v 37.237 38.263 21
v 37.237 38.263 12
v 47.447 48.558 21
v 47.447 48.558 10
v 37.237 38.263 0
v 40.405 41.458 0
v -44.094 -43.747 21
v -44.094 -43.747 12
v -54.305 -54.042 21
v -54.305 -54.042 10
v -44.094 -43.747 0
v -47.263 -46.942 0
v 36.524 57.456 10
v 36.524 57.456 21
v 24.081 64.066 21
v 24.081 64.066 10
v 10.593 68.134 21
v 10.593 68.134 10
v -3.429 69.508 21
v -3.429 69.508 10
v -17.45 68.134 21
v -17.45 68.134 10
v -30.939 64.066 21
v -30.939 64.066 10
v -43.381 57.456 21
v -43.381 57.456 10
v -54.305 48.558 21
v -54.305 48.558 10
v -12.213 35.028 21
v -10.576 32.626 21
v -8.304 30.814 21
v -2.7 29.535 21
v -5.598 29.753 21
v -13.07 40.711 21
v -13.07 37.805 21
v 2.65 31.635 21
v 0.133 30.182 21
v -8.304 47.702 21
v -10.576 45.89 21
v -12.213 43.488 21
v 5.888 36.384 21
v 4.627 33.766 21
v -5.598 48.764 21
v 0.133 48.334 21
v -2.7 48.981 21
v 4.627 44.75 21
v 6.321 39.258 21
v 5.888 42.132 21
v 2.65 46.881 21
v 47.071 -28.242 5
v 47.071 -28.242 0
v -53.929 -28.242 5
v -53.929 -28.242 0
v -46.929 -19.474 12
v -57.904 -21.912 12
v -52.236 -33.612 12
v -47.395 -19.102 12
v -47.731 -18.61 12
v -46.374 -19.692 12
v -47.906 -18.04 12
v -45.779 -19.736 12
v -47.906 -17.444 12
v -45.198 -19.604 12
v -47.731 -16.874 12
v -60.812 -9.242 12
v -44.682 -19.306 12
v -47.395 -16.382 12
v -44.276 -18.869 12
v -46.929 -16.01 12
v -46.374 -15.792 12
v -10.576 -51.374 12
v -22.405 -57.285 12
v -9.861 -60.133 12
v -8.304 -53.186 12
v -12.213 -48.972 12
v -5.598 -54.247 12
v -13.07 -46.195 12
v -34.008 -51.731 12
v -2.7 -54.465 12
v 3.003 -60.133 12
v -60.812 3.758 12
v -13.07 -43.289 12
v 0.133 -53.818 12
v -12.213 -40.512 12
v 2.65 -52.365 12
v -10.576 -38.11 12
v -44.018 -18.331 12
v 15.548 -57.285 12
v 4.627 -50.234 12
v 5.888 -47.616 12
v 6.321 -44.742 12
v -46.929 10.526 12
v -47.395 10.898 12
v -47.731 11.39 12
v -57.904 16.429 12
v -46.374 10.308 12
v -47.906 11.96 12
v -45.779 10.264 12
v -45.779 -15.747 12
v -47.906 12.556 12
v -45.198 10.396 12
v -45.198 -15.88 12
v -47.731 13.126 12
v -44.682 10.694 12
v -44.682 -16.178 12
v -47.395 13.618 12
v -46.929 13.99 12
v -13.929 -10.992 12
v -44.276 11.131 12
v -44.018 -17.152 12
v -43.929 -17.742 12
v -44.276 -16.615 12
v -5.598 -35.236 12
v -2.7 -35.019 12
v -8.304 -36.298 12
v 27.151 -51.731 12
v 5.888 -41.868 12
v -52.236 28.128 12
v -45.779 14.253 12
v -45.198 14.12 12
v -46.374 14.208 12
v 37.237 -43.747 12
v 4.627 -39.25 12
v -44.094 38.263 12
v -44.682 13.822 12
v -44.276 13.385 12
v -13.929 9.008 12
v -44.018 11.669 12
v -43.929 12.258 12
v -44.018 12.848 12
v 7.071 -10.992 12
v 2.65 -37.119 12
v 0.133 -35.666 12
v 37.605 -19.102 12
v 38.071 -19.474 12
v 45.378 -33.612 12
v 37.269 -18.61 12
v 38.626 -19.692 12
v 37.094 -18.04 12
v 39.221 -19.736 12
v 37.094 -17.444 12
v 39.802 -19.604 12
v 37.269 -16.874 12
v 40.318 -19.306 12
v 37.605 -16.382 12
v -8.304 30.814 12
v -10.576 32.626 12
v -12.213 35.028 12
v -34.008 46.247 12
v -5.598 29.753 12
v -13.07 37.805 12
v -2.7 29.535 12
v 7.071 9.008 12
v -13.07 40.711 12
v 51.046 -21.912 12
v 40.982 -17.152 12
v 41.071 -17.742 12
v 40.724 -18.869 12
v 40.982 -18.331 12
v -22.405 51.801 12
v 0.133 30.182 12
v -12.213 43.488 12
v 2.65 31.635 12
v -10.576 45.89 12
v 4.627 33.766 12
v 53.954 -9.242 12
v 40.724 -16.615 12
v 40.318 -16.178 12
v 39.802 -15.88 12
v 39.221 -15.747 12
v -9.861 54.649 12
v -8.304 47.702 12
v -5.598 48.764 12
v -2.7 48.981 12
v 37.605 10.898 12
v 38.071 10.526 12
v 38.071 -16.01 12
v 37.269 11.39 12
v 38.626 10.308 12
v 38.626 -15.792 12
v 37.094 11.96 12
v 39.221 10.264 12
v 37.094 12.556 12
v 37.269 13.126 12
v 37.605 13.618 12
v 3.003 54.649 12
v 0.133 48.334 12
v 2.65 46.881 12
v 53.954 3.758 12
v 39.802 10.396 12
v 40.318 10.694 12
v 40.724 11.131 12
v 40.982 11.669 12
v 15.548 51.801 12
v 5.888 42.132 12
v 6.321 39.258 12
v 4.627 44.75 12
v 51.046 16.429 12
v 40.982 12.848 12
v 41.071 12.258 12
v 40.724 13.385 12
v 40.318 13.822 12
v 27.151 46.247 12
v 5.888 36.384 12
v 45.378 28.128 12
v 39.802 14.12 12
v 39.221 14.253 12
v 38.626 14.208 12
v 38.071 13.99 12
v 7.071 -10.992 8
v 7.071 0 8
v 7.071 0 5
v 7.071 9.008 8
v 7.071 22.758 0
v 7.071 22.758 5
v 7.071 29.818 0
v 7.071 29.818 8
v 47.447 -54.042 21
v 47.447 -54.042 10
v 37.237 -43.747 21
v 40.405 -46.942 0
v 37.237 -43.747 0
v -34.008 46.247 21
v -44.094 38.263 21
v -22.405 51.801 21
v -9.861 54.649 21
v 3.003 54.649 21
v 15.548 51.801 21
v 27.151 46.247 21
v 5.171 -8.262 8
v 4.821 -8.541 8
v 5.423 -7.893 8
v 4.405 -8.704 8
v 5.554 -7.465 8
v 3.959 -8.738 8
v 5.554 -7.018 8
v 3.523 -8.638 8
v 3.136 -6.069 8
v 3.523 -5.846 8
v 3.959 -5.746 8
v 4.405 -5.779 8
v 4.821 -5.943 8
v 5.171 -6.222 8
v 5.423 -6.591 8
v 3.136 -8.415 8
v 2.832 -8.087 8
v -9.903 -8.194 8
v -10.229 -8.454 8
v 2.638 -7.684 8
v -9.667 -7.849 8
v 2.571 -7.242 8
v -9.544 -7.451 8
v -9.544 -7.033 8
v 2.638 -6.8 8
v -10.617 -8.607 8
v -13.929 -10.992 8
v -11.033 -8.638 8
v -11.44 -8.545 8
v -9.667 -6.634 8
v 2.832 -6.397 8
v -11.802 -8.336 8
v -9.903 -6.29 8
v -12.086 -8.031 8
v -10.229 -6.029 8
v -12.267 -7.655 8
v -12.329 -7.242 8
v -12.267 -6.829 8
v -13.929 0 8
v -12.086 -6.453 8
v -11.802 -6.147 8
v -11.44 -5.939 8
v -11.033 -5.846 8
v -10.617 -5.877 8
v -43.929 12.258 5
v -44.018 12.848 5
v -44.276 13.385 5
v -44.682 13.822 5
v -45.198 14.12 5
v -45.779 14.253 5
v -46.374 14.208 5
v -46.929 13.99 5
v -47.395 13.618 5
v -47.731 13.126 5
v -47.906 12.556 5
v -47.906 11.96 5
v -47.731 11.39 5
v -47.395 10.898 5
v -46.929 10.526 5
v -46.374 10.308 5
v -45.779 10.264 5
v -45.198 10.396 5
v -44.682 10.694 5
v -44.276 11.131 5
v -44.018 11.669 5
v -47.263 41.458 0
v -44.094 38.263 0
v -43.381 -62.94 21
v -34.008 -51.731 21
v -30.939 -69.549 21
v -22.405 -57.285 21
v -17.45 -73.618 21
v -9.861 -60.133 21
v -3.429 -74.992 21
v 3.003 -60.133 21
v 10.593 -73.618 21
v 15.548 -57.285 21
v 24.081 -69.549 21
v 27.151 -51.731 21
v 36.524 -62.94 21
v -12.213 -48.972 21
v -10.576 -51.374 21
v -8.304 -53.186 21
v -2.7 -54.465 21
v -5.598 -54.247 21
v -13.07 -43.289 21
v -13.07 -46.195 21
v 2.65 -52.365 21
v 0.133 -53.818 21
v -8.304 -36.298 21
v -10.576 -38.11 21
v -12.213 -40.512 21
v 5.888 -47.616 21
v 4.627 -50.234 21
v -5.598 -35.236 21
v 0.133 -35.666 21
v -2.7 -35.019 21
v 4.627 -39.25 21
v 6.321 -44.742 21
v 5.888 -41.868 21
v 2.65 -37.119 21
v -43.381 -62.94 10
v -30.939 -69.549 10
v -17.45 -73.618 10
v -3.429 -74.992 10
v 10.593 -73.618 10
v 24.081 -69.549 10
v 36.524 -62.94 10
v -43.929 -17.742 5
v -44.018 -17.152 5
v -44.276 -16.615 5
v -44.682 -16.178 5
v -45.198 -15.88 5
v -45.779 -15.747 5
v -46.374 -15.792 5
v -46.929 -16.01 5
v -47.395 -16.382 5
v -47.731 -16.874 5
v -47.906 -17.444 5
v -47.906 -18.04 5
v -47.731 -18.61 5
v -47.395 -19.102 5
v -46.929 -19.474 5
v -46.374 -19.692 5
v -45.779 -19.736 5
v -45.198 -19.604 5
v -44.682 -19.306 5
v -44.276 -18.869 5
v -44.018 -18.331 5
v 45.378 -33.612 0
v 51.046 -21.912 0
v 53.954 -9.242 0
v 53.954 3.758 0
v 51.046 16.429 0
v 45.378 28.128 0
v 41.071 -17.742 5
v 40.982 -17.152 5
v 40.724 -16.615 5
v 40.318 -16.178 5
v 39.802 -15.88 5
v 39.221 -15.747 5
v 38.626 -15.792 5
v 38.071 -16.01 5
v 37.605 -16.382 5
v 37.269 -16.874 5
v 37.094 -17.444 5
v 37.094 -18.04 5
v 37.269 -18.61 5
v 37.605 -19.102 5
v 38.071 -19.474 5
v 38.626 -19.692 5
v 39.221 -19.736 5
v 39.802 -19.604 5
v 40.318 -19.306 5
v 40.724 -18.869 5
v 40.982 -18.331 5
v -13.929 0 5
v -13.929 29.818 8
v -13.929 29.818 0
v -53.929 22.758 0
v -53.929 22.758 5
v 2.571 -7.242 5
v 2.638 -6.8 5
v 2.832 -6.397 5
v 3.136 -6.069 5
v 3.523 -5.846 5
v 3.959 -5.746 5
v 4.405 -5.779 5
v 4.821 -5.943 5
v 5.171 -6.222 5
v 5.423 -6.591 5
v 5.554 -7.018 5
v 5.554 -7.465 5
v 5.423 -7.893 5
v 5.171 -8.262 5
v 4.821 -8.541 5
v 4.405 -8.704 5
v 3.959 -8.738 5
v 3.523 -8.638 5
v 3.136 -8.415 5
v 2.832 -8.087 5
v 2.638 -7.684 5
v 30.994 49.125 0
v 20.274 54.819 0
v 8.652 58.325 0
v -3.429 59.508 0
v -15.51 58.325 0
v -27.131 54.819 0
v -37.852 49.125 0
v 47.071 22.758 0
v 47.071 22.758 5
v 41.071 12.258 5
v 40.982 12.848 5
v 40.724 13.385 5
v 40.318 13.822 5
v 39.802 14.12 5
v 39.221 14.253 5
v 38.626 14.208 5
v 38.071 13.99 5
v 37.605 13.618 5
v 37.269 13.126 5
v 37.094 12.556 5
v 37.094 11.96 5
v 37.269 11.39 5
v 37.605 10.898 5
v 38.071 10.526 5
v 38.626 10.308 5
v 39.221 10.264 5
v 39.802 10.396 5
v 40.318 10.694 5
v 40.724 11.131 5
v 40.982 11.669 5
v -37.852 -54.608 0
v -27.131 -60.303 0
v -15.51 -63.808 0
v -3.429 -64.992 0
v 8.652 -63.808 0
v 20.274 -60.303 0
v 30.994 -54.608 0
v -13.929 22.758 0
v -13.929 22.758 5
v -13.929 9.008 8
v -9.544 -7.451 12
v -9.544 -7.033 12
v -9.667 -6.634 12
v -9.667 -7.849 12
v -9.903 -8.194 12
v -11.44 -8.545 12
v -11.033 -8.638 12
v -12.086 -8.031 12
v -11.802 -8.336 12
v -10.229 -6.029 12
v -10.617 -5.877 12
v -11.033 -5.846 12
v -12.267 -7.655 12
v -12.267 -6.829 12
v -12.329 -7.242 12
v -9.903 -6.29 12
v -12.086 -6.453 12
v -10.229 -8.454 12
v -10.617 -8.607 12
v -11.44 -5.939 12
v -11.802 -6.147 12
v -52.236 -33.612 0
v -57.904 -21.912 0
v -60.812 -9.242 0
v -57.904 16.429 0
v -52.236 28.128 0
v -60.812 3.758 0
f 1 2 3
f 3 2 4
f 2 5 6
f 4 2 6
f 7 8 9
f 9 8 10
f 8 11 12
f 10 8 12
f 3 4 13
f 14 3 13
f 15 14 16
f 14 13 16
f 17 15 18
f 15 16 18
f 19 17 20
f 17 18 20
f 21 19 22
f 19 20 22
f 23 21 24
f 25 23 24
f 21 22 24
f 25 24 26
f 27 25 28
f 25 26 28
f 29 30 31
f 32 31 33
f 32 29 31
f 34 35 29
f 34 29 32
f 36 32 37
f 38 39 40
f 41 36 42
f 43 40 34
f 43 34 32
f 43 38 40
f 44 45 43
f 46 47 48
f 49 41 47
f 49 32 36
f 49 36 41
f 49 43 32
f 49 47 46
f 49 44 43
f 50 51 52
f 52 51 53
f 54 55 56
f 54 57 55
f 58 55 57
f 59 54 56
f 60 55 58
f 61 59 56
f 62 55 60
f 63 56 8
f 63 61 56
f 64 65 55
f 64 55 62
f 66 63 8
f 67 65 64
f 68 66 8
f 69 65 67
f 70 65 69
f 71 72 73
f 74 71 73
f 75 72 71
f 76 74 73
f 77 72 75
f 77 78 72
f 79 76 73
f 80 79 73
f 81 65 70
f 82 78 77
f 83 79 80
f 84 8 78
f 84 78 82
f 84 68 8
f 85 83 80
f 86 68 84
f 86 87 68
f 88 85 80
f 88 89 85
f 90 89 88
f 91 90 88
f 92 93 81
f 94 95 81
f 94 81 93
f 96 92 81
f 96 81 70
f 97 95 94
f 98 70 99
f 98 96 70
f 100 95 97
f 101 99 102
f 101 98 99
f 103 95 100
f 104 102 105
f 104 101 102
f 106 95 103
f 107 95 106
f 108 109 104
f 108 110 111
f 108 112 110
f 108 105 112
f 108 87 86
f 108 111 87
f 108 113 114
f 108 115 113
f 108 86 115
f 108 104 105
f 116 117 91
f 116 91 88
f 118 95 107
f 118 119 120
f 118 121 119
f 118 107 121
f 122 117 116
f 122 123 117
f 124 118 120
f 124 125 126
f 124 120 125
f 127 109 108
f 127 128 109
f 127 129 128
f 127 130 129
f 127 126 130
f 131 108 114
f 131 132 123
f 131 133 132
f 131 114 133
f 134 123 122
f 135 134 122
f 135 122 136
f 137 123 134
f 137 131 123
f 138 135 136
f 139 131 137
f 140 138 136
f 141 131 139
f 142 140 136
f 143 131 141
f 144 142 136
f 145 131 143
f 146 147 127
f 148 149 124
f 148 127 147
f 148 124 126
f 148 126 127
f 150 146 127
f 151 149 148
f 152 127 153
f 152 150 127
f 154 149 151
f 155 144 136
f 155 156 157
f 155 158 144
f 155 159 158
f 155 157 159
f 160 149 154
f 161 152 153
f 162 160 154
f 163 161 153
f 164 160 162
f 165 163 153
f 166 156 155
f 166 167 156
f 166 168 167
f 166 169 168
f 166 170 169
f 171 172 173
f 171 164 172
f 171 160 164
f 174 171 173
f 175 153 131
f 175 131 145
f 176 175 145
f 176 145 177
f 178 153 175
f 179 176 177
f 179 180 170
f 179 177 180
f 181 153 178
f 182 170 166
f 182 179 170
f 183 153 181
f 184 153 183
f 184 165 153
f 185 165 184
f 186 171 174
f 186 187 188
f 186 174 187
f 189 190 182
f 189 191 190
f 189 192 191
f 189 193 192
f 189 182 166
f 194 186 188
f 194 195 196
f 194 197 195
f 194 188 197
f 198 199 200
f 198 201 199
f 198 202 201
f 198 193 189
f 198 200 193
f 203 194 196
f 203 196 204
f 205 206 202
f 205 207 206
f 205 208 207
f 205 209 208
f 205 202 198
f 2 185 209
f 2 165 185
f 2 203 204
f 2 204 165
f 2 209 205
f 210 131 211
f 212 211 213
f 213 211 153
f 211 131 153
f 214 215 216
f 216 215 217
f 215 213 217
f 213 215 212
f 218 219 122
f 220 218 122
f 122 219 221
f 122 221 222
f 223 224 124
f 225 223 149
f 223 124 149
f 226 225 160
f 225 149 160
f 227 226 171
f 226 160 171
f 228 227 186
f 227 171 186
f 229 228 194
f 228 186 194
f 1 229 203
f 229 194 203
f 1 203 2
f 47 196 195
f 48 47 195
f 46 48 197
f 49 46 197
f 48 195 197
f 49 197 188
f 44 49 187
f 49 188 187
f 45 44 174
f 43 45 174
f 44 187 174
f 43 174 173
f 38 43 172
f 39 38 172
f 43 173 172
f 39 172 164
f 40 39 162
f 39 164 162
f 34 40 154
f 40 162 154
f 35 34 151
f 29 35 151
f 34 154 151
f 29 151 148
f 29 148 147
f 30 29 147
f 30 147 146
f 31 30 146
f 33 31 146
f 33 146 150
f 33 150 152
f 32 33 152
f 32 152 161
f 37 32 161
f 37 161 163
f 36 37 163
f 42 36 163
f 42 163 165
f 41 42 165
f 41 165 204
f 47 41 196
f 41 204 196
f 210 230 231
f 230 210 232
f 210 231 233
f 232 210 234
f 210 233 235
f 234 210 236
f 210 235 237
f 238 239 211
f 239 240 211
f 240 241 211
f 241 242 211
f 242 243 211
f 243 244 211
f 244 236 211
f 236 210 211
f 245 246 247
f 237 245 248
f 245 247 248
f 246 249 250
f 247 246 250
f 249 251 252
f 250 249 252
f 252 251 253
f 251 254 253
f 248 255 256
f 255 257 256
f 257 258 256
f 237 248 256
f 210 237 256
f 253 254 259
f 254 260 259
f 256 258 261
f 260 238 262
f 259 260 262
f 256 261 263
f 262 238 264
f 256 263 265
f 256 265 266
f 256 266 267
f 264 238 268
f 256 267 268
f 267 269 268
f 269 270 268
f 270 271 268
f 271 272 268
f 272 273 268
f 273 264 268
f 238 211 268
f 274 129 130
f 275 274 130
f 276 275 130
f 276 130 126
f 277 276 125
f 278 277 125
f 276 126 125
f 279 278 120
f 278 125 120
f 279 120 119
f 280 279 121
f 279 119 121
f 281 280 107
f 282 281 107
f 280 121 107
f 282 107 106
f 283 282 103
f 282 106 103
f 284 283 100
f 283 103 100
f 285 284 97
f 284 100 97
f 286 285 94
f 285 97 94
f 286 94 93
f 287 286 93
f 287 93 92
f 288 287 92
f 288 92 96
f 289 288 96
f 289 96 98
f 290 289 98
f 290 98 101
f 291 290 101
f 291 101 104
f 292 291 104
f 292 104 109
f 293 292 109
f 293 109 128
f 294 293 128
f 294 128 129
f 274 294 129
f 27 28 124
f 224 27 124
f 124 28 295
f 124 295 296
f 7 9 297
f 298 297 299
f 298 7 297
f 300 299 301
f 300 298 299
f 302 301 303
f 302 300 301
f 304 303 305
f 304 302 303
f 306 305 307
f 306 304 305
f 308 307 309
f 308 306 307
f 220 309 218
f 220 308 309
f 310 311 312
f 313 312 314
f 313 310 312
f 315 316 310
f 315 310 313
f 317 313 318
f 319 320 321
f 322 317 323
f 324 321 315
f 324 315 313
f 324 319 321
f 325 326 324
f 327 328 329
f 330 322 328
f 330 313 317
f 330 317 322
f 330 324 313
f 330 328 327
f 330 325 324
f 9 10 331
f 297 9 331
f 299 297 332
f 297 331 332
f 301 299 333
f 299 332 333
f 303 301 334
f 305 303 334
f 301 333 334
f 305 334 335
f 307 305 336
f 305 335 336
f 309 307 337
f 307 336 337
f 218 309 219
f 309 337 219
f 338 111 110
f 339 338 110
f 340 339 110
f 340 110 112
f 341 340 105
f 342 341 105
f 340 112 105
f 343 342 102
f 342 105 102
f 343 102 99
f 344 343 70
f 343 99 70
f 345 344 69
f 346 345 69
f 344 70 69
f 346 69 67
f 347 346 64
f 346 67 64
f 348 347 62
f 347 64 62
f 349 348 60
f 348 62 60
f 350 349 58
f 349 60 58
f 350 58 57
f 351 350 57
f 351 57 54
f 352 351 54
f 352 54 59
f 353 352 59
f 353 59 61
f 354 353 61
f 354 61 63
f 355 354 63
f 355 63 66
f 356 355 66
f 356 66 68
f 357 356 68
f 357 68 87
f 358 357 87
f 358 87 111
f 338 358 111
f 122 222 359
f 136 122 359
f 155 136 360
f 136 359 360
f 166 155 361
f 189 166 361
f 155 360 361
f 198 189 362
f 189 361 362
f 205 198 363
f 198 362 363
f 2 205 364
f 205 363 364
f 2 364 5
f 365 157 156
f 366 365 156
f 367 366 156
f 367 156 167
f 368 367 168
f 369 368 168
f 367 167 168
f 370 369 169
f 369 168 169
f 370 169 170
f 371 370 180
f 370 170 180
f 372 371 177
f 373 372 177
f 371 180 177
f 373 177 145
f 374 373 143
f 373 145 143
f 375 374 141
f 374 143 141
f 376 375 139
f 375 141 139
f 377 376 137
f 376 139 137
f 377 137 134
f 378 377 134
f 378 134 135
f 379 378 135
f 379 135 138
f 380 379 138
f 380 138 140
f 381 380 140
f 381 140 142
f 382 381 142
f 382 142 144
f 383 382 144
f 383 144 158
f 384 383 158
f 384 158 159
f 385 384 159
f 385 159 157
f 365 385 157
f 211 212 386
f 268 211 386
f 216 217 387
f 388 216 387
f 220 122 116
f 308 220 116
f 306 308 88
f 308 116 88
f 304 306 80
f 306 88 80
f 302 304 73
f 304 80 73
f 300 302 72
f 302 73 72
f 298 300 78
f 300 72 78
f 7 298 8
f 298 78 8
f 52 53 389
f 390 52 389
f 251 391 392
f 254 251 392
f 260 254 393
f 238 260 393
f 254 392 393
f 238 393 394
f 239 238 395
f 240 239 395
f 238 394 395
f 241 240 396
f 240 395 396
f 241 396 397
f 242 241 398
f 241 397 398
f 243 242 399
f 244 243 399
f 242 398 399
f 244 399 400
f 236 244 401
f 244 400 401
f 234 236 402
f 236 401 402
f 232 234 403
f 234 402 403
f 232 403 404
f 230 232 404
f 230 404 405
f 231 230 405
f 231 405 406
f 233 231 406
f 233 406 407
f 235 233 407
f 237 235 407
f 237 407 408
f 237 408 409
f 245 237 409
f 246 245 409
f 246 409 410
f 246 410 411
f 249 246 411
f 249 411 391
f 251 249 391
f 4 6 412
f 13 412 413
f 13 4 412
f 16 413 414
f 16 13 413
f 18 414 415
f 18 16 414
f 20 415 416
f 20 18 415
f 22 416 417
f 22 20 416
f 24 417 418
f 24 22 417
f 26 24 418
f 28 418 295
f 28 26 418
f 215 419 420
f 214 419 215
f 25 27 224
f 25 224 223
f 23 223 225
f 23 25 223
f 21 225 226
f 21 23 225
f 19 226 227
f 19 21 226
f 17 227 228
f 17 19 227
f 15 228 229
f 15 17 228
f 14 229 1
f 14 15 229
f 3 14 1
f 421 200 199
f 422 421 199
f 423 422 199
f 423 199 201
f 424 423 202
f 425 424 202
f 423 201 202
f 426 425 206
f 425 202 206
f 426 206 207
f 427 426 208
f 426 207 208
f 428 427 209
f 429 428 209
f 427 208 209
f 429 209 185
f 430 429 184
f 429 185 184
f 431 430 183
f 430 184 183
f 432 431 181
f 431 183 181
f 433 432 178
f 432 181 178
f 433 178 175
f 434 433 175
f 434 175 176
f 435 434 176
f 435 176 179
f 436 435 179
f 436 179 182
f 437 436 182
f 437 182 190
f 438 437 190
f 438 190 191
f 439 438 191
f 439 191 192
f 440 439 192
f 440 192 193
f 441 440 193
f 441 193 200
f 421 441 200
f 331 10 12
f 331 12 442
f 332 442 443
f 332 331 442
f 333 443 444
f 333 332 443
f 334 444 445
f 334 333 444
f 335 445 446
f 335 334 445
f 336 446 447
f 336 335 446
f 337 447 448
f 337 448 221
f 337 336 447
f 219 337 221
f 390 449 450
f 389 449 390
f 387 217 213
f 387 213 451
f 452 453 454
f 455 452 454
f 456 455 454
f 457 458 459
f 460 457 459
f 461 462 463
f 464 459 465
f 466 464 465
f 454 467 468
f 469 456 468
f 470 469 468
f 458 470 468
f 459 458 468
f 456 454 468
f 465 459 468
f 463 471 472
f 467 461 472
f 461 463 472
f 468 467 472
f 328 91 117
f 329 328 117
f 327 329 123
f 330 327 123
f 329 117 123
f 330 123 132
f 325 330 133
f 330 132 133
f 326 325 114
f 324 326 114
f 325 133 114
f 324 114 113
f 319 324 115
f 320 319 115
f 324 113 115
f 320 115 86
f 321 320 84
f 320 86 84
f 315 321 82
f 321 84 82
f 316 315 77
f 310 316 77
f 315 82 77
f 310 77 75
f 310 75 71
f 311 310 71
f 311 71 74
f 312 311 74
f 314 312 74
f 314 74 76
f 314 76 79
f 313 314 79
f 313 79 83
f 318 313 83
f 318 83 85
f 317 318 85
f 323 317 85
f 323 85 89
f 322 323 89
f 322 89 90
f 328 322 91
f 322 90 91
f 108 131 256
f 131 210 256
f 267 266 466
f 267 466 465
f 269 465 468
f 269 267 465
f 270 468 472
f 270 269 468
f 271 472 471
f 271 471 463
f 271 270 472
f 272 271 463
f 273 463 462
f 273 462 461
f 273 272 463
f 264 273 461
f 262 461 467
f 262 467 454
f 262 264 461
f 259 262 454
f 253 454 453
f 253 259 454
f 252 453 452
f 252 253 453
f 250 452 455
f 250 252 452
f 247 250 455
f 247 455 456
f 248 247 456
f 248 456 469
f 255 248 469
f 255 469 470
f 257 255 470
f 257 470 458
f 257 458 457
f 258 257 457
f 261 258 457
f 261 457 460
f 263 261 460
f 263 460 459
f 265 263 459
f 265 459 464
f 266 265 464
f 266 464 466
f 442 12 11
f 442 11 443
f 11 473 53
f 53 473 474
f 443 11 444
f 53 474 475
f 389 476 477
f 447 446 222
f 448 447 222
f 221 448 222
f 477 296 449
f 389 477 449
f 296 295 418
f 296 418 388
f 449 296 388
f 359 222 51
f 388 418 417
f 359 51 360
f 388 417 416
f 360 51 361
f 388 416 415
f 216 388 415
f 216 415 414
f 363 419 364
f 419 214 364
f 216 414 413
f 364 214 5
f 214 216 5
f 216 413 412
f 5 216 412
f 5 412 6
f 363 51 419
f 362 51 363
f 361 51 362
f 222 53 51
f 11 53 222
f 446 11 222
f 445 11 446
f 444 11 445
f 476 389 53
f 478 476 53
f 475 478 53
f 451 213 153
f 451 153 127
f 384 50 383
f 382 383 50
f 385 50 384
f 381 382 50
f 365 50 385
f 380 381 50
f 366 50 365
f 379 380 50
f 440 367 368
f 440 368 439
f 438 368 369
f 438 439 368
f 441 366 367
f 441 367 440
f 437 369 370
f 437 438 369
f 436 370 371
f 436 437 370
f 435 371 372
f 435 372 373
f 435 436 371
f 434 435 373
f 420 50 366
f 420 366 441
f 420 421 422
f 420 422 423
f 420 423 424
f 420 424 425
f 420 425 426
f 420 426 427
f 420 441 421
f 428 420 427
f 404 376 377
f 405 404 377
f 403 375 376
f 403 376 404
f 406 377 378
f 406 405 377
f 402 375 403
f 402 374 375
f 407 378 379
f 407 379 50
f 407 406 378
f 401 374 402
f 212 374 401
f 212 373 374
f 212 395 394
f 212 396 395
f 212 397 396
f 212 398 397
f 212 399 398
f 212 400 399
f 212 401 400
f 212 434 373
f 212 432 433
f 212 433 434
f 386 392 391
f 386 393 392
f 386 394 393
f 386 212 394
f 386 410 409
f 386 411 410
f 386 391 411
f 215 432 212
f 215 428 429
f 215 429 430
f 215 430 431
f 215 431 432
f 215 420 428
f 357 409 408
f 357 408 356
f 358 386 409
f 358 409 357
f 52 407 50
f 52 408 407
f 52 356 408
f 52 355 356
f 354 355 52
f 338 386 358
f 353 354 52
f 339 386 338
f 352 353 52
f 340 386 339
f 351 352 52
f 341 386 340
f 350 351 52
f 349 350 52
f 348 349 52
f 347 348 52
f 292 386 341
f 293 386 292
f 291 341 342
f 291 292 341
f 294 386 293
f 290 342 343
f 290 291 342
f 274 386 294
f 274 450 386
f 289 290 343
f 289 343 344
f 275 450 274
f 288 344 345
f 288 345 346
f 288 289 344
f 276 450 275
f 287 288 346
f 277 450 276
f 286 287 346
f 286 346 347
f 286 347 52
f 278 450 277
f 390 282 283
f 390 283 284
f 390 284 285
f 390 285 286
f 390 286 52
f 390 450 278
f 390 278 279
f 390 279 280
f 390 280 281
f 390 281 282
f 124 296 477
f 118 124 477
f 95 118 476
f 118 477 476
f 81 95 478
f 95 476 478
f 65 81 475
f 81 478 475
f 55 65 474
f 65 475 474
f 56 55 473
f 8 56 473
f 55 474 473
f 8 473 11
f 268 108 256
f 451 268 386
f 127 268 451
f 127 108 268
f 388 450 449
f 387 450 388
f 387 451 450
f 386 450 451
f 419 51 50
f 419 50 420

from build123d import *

# Parameters (mm, degrees)
SKETCH1_R               = 57.75
BOSS_EXTRUDE2_DEPTH     = 12
BOSS_EXTRUDE3_DEPTH     = 21
SKETCH2_W               = 101
SKETCH2_H               = 51
CUT_EXTRUDE1_DEPTH      = 5
SKETCH4_W               = 21
SKETCH4_H               = 20
CUT_EXTRUDE2_DEPTH      = 8
SKETCH5_W               = 21
SKETCH5_H               = 40.810106116
CUT_EXTRUDE3_DEPTH      = 35
CUT_EXTRUDE3_DEPTH_BACK = 3
SKETCH6_W               = 21
SKETCH6_H               = 10.991891623
BOSS_EXTRUDE4_DEPTH     = 3
SKETCH9_R               = 2
CUT_EXTRUDE6_DEPTH      = 31
SKETCH12_R              = 9.75
BOSS_EXTRUDE5_DEPTH     = 9
SKETCH7_R               = 1.4
BOSS_EXTRUDE6_DEPTH     = 7
SKETCH7_6_R             = 1.5
CUT_EXTRUDE10_DEPTH     = 10
CHAMFER1_SIZE           = 10


with BuildPart() as part:
    # Sketch1 → Boss-Extrude2 (new body)
    with BuildSketch(Plane.XY):
        with Locations((-3.428783881, -2.741891623)):
            Circle(SKETCH1_R)
    extrude(amount=BOSS_EXTRUDE2_DEPTH)

    # Sketch1<4> → Boss-Extrude3 (add)
    with BuildSketch(Plane.XY):
        with BuildLine():
            Line((-54.304676832, 48.558264482), (-44.094290011, 38.262731423))
            ThreePointArc((-44.094290011, 38.262731423), (-3.428783881, 55.008108377), (37.23672225, 38.262731423))
            Line((37.23672225, 38.262731423), (47.44710907, 48.558264482))
            ThreePointArc((47.44710907, 48.558264482), (-3.428783881, 69.508108377), (-54.304676832, 48.558264482))
        make_face()
        with BuildLine():
            ThreePointArc((37.23672225, -43.746514669), (-3.428783881, -60.491891623), (-44.094290011, -43.746514669))
            Line((-44.094290011, -43.746514669), (-54.304676832, -54.042047728))
            ThreePointArc((-54.304676832, -54.042047728), (-3.428783881, -74.991891623), (47.44710907, -54.042047728))
            Line((47.44710907, -54.042047728), (37.23672225, -43.746514669))
        make_face()
    extrude(amount=BOSS_EXTRUDE3_DEPTH)

    # Sketch2 → Cut-Extrude1 (cut)
    with BuildSketch(Plane(origin=(0, 0, 0), x_dir=(-1, 0, 0), z_dir=(0, 0, -1))):
        with Locations((3.428783881, -2.741891623)):
            Rectangle(SKETCH2_W, SKETCH2_H)
    extrude(amount=-CUT_EXTRUDE1_DEPTH, mode=Mode.SUBTRACT)

    # Sketch4 → Cut-Extrude2 (cut)
    with BuildSketch(Plane(origin=(0, 0, 5), x_dir=(-1, 0, 0), z_dir=(0, 0, -1))):
        with Locations((3.428783881, -0.991891623)):
            Rectangle(SKETCH4_W, SKETCH4_H)
    extrude(amount=-CUT_EXTRUDE2_DEPTH, mode=Mode.SUBTRACT)

    # Sketch5 → Cut-Extrude3 (cut, two sides)
    with BuildSketch(Plane(origin=(0, 0, 5), x_dir=(-1, 0, 0), z_dir=(0, 0, -1))) as cut_extrude3_sk:
        with Locations((3.428783881, 9.413161435)):
            Rectangle(SKETCH5_W, SKETCH5_H)
    extrude(amount=CUT_EXTRUDE3_DEPTH, mode=Mode.SUBTRACT)
    extrude(cut_extrude3_sk.sketch, amount=-CUT_EXTRUDE3_DEPTH_BACK, mode=Mode.SUBTRACT)

    # Sketch6 → Boss-Extrude4 (add)
    with BuildSketch(Plane(origin=(0, 0, 5), x_dir=(-1, 0, 0), z_dir=(0, 0, -1))):
        with Locations((3.428783881, -5.495945812)):
            Rectangle(SKETCH6_W, SKETCH6_H)
    extrude(amount=-BOSS_EXTRUDE4_DEPTH)

    # Sketch9 → Cut-Extrude6 (cut)
    with BuildSketch(Plane.XY.offset(12)):
        with Locations((-45.928783881, -17.741891623)):
            Circle(SKETCH9_R)
        with Locations((-45.928783881, 12.258108377)):
            Circle(SKETCH9_R)
        with Locations((39.071216119, 12.258108377)):
            Circle(SKETCH9_R)
        with Locations((39.071216119, -17.741891623)):
            Circle(SKETCH9_R)
    extrude(amount=-CUT_EXTRUDE6_DEPTH, mode=Mode.SUBTRACT)

    # Sketch12 → Boss-Extrude5 (add)
    with BuildSketch(Plane.XY.offset(12)):
        with Locations((-3.428783881, -44.741891623)):
            Circle(SKETCH12_R)
        with Locations((-3.428783881, 39.258108377)):
            Circle(SKETCH12_R)
    extrude(amount=BOSS_EXTRUDE5_DEPTH)

    # Sketch7 → Boss-Extrude6 (add)
    with BuildSketch(Plane(origin=(0, 0, 5), x_dir=(-1, 0, 0), z_dir=(0, 0, -1))):
        with Locations((10.928783881, -7.241891623)):
            Circle(SKETCH7_R)
    extrude(amount=-BOSS_EXTRUDE6_DEPTH)

    # Sketch7<6> → Cut-Extrude10 (cut)
    with BuildSketch(Plane(origin=(0, 0, 5), x_dir=(-1, 0, 0), z_dir=(0, 0, -1))):
        with Locations((-4.071216119, -7.241891623)):
            Circle(SKETCH7_6_R)
    extrude(amount=-CUT_EXTRUDE10_DEPTH, mode=Mode.SUBTRACT)

    # Chamfer1
    chamfer1_edges = [part.edges().sort_by_distance(p)[0] for p in [
        (-3.428783881, -74.991891623, 0),
        (-3.428783881, 69.508108377, 0),
    ]]
    chamfer(chamfer1_edges, length=CHAMFER1_SIZE)


solid = part.part
